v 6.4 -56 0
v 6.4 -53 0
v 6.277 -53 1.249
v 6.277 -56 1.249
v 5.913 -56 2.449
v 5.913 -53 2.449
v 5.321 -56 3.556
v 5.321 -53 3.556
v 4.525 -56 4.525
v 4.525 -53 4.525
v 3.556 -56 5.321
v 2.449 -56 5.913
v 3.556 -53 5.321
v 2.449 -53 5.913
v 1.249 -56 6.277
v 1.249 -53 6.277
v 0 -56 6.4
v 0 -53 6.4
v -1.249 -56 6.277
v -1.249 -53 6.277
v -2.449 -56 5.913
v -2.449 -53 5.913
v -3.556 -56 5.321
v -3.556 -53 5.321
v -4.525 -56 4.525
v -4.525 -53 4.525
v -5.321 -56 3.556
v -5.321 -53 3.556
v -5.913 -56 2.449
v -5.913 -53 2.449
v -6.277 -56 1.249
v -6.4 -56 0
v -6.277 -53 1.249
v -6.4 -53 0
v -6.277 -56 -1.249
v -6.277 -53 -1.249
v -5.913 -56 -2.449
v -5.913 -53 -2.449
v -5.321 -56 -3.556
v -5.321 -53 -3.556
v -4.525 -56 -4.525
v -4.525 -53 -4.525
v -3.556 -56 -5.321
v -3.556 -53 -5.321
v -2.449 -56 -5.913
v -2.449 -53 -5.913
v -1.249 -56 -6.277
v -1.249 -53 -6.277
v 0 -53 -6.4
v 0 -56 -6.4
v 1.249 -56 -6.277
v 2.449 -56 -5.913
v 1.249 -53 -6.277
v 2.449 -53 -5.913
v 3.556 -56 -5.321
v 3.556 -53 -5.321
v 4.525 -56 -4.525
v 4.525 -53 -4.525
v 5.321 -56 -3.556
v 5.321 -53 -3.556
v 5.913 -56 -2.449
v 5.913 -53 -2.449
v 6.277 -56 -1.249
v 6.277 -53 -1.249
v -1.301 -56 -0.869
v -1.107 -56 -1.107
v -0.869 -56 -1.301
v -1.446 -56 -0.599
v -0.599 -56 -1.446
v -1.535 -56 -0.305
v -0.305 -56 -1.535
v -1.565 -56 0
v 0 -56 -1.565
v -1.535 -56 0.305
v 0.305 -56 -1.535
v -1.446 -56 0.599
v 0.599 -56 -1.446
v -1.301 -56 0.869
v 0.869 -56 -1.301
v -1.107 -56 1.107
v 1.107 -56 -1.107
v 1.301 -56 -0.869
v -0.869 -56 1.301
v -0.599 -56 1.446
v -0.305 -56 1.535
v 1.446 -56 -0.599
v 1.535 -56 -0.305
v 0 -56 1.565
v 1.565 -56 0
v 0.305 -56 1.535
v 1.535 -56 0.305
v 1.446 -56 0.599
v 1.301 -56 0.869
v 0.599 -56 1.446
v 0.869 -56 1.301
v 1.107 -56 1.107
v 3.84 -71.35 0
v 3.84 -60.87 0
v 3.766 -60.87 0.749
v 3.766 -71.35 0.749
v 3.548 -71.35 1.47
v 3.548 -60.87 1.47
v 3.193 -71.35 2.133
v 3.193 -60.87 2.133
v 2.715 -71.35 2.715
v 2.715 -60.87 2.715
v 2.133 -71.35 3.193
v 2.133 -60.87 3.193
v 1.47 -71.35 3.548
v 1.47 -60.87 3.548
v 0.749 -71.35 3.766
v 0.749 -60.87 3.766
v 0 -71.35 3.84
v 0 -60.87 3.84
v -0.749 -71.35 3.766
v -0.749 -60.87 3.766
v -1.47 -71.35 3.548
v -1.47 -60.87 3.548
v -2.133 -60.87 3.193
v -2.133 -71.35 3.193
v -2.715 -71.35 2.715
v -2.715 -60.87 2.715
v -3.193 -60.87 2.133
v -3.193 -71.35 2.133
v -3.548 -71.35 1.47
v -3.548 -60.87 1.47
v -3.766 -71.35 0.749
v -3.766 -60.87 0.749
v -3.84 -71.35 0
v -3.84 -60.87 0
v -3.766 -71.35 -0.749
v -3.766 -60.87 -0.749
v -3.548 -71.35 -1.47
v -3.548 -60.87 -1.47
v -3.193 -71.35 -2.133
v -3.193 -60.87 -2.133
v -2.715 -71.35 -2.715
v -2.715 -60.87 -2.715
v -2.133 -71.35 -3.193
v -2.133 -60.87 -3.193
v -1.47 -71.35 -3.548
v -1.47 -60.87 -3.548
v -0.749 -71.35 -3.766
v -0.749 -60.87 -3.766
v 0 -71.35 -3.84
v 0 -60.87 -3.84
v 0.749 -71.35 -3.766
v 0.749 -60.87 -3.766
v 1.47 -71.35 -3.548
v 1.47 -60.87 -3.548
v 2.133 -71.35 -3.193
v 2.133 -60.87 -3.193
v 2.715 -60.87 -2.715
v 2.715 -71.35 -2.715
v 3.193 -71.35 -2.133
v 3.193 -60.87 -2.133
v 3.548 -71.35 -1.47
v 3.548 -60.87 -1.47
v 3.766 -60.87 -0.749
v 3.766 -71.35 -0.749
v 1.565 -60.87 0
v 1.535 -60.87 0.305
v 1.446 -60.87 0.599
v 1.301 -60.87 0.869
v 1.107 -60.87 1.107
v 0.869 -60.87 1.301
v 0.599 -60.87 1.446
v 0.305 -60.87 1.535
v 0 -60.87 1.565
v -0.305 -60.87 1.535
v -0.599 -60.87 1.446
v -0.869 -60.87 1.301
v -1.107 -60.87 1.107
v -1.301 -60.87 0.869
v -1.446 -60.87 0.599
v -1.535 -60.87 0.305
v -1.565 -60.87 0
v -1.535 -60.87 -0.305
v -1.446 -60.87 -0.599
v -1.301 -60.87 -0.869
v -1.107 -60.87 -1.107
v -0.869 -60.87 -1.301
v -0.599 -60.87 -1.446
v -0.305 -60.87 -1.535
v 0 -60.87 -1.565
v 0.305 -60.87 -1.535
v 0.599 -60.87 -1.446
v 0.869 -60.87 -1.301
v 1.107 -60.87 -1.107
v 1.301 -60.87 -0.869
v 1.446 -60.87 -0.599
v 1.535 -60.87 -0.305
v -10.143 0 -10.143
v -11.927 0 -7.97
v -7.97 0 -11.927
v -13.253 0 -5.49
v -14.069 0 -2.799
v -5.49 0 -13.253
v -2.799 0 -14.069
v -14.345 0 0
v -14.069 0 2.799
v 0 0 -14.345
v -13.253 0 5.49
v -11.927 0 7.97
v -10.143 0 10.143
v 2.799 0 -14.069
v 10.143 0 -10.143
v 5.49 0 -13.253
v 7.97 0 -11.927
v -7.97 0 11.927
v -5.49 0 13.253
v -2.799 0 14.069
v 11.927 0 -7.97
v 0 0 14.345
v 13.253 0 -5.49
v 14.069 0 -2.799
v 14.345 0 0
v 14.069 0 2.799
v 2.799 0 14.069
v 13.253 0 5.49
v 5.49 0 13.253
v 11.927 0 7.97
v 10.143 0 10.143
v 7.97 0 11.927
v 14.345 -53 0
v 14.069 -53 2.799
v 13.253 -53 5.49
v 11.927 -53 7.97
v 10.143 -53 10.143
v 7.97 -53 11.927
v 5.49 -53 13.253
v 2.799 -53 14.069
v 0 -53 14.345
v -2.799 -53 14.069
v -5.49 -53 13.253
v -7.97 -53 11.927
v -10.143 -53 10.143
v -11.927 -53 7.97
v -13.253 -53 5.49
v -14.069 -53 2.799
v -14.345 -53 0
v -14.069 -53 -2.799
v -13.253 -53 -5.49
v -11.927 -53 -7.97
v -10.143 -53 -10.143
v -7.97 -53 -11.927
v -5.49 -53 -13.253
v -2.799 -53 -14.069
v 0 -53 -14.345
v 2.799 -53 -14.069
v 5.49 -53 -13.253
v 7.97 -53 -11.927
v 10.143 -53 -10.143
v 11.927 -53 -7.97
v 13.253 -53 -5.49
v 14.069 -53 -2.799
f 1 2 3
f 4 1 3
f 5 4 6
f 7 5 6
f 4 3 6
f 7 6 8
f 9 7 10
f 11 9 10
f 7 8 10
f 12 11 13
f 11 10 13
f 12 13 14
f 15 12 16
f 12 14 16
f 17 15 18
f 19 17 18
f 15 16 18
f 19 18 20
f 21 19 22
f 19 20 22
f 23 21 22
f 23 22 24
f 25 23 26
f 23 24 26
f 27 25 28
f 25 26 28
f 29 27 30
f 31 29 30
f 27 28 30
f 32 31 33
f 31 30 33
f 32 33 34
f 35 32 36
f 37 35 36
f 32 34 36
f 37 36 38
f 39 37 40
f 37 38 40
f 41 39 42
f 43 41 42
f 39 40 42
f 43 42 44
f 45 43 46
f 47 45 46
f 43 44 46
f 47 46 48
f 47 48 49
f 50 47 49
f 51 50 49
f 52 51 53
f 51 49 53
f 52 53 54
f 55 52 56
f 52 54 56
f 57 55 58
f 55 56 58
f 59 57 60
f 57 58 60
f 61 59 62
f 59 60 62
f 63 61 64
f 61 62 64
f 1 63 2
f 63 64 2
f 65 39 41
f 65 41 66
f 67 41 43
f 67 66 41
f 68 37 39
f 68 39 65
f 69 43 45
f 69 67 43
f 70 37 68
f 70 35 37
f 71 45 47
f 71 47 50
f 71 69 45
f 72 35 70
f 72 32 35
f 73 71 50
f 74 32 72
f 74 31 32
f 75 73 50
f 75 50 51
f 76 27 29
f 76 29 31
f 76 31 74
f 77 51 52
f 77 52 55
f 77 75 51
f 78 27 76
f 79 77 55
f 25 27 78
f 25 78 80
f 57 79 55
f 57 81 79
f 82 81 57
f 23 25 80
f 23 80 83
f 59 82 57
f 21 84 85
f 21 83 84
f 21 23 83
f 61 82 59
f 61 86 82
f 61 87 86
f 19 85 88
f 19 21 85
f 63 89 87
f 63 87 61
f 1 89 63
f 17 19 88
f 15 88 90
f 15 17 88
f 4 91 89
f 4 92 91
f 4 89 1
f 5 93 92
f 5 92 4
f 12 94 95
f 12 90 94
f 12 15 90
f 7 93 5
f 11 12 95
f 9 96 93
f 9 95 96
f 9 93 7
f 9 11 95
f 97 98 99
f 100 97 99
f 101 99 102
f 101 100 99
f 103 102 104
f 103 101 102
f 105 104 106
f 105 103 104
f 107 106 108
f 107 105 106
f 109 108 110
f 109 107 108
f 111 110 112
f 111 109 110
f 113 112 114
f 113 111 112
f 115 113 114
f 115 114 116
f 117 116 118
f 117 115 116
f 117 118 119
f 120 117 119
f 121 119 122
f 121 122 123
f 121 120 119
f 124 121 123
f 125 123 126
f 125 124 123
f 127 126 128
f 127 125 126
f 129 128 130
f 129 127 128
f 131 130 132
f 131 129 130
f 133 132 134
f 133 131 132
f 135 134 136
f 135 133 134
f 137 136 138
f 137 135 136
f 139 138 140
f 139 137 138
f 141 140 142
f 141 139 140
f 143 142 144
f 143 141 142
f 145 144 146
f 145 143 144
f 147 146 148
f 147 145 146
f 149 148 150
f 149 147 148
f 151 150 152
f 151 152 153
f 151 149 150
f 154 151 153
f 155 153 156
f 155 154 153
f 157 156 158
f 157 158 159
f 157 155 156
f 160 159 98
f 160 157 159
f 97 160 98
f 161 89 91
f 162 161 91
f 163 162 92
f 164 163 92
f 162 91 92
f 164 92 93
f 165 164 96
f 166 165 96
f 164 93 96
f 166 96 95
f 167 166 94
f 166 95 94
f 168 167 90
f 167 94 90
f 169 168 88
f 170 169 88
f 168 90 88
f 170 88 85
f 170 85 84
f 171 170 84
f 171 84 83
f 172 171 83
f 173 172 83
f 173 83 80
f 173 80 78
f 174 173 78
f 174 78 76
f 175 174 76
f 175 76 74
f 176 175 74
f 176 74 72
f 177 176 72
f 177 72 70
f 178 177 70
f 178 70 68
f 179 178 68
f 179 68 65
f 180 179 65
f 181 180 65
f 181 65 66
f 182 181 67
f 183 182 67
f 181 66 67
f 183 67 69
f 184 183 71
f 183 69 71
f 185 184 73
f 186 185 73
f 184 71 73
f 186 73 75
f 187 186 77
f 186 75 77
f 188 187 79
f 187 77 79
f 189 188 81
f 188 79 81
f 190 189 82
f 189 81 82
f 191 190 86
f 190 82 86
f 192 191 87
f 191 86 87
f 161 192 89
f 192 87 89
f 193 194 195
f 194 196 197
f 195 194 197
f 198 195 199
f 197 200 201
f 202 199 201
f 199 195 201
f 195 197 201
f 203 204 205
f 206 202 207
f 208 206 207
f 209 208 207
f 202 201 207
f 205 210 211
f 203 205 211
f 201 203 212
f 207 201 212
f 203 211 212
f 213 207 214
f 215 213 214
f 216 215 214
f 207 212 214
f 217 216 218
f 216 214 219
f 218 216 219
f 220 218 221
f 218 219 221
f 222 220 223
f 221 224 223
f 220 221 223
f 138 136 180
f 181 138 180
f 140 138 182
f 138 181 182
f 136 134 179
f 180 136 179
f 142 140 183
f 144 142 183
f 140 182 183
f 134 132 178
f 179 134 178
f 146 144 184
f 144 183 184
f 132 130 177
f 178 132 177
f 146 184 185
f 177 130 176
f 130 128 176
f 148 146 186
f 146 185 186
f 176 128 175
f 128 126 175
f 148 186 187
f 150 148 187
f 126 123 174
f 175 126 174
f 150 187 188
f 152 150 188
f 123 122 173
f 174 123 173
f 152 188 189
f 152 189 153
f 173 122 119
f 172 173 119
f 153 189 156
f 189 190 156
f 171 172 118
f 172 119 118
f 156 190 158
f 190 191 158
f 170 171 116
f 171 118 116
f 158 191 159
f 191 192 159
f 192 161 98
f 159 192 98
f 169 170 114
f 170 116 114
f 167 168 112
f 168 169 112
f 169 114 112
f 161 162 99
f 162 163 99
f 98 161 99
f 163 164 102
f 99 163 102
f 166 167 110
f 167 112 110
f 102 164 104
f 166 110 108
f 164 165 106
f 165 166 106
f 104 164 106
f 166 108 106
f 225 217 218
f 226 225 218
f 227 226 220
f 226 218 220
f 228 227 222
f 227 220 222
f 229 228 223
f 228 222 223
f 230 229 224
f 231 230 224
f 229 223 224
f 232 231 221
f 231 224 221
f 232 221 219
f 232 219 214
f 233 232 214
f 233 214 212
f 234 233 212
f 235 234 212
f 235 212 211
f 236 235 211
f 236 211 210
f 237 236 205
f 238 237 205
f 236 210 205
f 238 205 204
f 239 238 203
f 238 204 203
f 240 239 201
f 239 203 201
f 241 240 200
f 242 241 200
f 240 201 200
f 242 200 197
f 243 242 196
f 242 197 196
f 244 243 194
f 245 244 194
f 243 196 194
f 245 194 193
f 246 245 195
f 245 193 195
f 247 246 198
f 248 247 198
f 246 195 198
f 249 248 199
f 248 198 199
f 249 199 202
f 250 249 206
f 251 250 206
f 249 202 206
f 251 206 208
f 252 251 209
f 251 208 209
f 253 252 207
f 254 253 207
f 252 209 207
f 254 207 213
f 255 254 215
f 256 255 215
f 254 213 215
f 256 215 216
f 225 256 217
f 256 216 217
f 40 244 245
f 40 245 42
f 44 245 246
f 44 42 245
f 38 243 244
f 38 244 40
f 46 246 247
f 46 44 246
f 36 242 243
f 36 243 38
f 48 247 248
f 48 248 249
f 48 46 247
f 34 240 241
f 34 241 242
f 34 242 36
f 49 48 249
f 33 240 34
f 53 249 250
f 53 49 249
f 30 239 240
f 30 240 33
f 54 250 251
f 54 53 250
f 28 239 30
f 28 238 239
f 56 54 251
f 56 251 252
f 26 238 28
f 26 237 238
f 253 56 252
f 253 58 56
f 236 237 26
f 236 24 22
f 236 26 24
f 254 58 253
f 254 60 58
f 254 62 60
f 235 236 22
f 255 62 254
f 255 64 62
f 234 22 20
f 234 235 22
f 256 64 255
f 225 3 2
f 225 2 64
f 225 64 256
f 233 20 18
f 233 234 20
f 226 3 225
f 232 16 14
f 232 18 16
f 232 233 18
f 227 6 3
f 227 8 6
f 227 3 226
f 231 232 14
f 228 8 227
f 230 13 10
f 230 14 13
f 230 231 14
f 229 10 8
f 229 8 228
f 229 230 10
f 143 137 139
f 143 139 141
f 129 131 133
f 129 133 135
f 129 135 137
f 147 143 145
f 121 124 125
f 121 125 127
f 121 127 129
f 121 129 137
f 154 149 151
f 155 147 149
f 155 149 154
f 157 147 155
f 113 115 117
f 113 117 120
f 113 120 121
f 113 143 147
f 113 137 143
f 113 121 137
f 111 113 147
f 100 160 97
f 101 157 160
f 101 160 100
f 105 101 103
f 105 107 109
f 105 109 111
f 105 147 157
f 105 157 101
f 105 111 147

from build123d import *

# Parameters (mm, degrees)
F0_R     = 14.345
F1_DEPTH = 53
F2_R     = 6.4
F3_DEPTH = 3
F4_R     = 1.565
F5_DEPTH = 15.35
F6_R     = 3.84
F6_R_2   = 1.565
F7_DEPTH = 10.48


with BuildPart() as f1:
    # F0 (on Front) → F1 (new body)
    with BuildSketch(Plane.XZ):
        Circle(F0_R)
    extrude(amount=F1_DEPTH)

    # F2 (on face) → F3 (join)
    with BuildSketch(Plane.XZ.offset(53)):
        Circle(F2_R)
    extrude(amount=F3_DEPTH)

    # F4 (on face) → F5 (join)
    with BuildSketch(Plane.XZ.offset(56)):
        Circle(F4_R)
    extrude(amount=F5_DEPTH)

    # F6 (on face) → F7 (join)
    with BuildSketch(Plane.XZ.offset(71.35)):
        Circle(F6_R)
        Circle(F6_R_2, mode=Mode.SUBTRACT)
    extrude(amount=-F7_DEPTH)


solid = f1.part
